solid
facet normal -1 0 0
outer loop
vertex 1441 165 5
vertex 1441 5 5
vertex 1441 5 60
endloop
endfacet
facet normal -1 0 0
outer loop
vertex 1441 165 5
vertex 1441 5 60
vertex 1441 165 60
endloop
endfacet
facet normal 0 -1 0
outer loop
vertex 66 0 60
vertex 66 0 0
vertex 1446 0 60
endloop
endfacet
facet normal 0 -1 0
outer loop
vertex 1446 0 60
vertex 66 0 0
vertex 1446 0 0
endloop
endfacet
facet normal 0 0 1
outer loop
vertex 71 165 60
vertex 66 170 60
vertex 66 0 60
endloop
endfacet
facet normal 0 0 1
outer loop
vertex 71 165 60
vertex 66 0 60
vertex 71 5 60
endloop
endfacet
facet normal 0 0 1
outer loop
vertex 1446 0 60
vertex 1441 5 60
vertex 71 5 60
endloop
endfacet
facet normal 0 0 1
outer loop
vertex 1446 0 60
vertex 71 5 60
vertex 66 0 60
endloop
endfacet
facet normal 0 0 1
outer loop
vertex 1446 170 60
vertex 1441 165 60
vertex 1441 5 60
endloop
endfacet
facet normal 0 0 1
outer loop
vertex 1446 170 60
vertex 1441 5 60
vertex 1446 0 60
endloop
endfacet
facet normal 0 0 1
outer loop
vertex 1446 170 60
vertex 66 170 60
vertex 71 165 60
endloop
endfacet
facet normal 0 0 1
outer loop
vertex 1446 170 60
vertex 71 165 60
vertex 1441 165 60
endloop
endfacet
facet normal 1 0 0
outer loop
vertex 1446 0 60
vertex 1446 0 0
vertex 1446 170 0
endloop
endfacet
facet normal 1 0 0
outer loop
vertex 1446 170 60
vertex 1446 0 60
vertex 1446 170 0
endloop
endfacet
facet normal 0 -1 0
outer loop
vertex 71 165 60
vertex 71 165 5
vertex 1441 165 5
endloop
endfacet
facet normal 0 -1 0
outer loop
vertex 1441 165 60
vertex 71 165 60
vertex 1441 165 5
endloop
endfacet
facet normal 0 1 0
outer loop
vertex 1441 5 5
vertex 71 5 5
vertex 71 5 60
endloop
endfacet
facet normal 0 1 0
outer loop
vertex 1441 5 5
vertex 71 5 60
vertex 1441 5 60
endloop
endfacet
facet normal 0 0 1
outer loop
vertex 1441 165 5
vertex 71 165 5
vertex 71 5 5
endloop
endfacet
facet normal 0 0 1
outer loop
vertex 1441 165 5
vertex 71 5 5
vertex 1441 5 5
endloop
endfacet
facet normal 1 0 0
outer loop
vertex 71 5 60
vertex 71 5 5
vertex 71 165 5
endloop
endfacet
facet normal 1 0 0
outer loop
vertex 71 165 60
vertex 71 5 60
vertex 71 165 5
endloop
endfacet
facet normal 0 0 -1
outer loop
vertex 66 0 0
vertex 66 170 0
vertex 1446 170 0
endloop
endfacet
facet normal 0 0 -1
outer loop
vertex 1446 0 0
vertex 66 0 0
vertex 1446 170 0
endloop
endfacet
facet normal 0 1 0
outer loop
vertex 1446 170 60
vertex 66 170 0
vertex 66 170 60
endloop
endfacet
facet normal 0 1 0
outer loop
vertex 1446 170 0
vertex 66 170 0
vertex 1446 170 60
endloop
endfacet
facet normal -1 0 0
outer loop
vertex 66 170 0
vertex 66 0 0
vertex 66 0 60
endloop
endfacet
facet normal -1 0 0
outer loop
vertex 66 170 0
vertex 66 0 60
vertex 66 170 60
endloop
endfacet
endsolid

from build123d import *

# Parameters (mm, degrees)
BOX001_W     = 1370
BOX001_H     = 160
BOX001_DEPTH = 60
BOX_W        = 1380
BOX_H        = 170
BOX_DEPTH    = 60


with BuildPart() as box001:
    # Box001 → Box001 (new body)
    with BuildSketch(Plane(origin=(5, 5, 5), x_dir=(1, 0, 0), z_dir=(0, 0, 1))):
        with Locations((685, 80)):
            Rectangle(BOX001_W, BOX001_H)
    extrude(amount=BOX001_DEPTH)


with BuildPart() as trough:
    # Box → Box (new body)
    with BuildSketch(Plane.XY):
        with Locations((690, 85)):
            Rectangle(BOX_W, BOX_H)
    extrude(amount=BOX_DEPTH)

    # Cut: cut Box001
    add(box001.part, mode=Mode.SUBTRACT)


with BuildPart() as trough_1:
    # Cut placement: moved
    add(trough.part.moved(Location((66, 0, 0))))


solid = trough_1.part
